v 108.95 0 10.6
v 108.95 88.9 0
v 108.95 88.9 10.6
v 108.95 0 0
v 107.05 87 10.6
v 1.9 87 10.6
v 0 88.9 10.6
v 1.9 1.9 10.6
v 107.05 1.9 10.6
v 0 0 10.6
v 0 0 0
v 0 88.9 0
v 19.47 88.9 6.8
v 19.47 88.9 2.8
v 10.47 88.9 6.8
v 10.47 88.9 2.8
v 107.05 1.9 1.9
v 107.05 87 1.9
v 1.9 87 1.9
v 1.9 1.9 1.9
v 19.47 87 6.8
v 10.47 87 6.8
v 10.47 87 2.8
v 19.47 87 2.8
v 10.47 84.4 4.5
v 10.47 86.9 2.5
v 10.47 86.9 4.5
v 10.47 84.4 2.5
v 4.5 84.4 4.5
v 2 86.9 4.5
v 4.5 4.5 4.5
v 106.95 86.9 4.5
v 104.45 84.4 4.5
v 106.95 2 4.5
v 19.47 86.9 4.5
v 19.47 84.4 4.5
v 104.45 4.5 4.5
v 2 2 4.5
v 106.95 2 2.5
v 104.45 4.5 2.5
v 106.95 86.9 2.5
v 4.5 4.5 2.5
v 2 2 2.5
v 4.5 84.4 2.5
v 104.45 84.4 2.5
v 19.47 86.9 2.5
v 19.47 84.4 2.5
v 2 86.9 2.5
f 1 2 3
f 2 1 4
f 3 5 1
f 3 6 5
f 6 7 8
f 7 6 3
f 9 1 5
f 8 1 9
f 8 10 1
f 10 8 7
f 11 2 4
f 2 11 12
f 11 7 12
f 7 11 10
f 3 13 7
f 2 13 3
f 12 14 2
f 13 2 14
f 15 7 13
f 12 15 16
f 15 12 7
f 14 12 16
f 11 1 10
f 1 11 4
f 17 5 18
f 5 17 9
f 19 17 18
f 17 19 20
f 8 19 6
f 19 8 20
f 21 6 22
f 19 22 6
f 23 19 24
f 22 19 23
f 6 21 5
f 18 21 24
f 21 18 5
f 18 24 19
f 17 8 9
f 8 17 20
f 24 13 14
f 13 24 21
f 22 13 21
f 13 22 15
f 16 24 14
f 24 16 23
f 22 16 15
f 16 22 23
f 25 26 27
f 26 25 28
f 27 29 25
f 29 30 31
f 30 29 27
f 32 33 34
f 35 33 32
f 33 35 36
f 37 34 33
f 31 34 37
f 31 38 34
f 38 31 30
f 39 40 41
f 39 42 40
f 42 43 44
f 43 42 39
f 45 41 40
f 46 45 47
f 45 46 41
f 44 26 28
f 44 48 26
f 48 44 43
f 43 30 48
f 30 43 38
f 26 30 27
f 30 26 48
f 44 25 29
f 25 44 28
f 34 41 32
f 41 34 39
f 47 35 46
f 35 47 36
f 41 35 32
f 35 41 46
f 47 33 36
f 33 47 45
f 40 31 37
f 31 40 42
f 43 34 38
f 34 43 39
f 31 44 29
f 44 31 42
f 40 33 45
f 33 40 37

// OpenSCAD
// file: params.scad
// ============================================
// AUTO-GENERATED — do not edit by hand
// Generated by parse_kicad.py
// ============================================

// ----- Board dimensions -----
pcb_len      = 103.95;
pcb_wid      = 83.9;
pcb_thick    = 1.6;

// ----- Case design parameters -----
wall_thick   = 2.0;
bottom_thick = 2.0;
clear_above_pcb = 5.0;
pcb_clearance = 1.0;
pcb_floor_gap = 0.5;

// ----- Plate parameters -----
plate_thick  = 2.0;
gap_above_pcb = 0.5;

// ----- Ledge parameters -----
ledge_height = 2.0;
ledge_thick  = 2.5;

// ----- Key switch parameters -----
key_size     = 13.97;
key_pitch_x  = 19.2;
key_pitch_y  = 19.2;
grid_cols    = 4;
grid_rows    = 4;

// Switch center positions (board-relative, mm)
switch_positions = [
    [33.171, 13.1278],
    [52.371, 13.1278],
    [71.571, 13.1278],
    [90.771, 13.1278],
    [33.171, 32.3278],
    [52.371, 32.3278],
    [71.571, 32.3278],
    [90.771, 32.3278],
    [33.171, 51.5278],
    [52.371, 51.5278],
    [71.571, 51.5278],
    [90.771, 51.5278],
    [33.171, 70.7278],
    [52.371, 70.7278],
    [71.571, 70.7278],
    [90.771, 70.7278],
];

// ----- USB connector -----
usb_x        = 12.97;
usb_y        = 3.46;
usb_edge     = "top";
usb_width    = 9.0;
usb_height   = 4.0;
usb_bottom_clear = 0.8;

// ----- MCU -----
mcu_x        = 12.97;
mcu_y        = 15.46;
mcu_width    = 21.3;
mcu_height   = 26.0;
// MCU bounding box (board-relative): [2.57, 2.71] to [23.87, 28.71]
mcu_bbox_x0  = 2.57;
mcu_bbox_y0  = 2.71;
mcu_bbox_x1  = 23.87;
mcu_bbox_y1  = 28.71;
// main file
// ============================================
// Bottom case — auto-generated
// include the params file first
// ============================================
include <params.scad>

// ----- Derived -----
pcb_len_clearance = pcb_len + pcb_clearance;
pcb_wid_clearance = pcb_wid + pcb_clearance;

outer_len    = pcb_len_clearance + 2*wall_thick;
outer_wid    = pcb_wid_clearance + 2*wall_thick;
case_inner_z = bottom_thick + pcb_thick + clear_above_pcb;
case_total_z = case_inner_z + wall_thick;

// PCB-support ledge Z
ledge_z0 = bottom_thick + pcb_floor_gap;

// USB position in case coordinates
// USB is specified relative to board origin; we add wall_thick offset
usb_case_x = wall_thick + usb_x;
usb_case_y = wall_thick + usb_y;

// USB cutout extents
usb_x0 = usb_case_x - usb_width/2;
usb_x1 = usb_case_x + usb_width/2;

// Z position for USB opening
usb_bottom_z = bottom_thick + usb_bottom_clear;

module bottom_case() {
    difference() {
        // outer shell
        cube([outer_len, outer_wid, case_total_z]);

        // inner cavity
        translate([wall_thick - 0.1, wall_thick - 0.1, bottom_thick - 0.1])
            cube([pcb_len_clearance + 0.2, pcb_wid_clearance + 0.2,
                  case_inner_z + wall_thick + 0.2]);

        // USB-C cutout — placed on the correct edge
        if (usb_edge == "top") {
            // top = min Y in KiCad = +Y wall in OpenSCAD (if not flipped)
            // Adjust based on your coordinate convention
            translate([usb_x0, outer_wid - wall_thick - 0.2, usb_bottom_z])
                cube([usb_width, wall_thick + 0.4, usb_height]);
        }
        if (usb_edge == "bottom") {
            translate([usb_x0, -0.2, usb_bottom_z])
                cube([usb_width, wall_thick + 0.4, usb_height]);
        }
        if (usb_edge == "left") {
            translate([-0.2, usb_case_y - usb_width/2, usb_bottom_z])
                cube([wall_thick + 0.4, usb_width, usb_height]);
        }
        if (usb_edge == "right") {
            translate([outer_len - wall_thick - 0.2, usb_case_y - usb_width/2, usb_bottom_z])
                cube([wall_thick + 0.4, usb_width, usb_height]);
        }
    }

    // ----- PCB support ledge -----
    // front ledge (-Y)
    translate([wall_thick, wall_thick, ledge_z0])
        cube([pcb_len_clearance, ledge_thick, ledge_height]);

    // back ledge (+Y) — split around USB if USB is on this edge
    if (usb_edge == "top") {
        // left segment
        translate([wall_thick, outer_wid - wall_thick - ledge_thick, ledge_z0])
            cube([usb_x0 - wall_thick, ledge_thick, ledge_height]);
        // right segment
        translate([usb_x1, outer_wid - wall_thick - ledge_thick, ledge_z0])
            cube([outer_len - wall_thick - usb_x1, ledge_thick, ledge_height]);
    } else {
        translate([wall_thick, outer_wid - wall_thick - ledge_thick, ledge_z0])
            cube([pcb_len_clearance, ledge_thick, ledge_height]);
    }

    // left side ledge
    translate([wall_thick, wall_thick, ledge_z0])
        cube([ledge_thick, pcb_wid_clearance, ledge_height]);

    // right side ledge
    translate([outer_len - wall_thick - ledge_thick, wall_thick, ledge_z0])
        cube([ledge_thick, pcb_wid_clearance, ledge_height]);
}

bottom_case();
